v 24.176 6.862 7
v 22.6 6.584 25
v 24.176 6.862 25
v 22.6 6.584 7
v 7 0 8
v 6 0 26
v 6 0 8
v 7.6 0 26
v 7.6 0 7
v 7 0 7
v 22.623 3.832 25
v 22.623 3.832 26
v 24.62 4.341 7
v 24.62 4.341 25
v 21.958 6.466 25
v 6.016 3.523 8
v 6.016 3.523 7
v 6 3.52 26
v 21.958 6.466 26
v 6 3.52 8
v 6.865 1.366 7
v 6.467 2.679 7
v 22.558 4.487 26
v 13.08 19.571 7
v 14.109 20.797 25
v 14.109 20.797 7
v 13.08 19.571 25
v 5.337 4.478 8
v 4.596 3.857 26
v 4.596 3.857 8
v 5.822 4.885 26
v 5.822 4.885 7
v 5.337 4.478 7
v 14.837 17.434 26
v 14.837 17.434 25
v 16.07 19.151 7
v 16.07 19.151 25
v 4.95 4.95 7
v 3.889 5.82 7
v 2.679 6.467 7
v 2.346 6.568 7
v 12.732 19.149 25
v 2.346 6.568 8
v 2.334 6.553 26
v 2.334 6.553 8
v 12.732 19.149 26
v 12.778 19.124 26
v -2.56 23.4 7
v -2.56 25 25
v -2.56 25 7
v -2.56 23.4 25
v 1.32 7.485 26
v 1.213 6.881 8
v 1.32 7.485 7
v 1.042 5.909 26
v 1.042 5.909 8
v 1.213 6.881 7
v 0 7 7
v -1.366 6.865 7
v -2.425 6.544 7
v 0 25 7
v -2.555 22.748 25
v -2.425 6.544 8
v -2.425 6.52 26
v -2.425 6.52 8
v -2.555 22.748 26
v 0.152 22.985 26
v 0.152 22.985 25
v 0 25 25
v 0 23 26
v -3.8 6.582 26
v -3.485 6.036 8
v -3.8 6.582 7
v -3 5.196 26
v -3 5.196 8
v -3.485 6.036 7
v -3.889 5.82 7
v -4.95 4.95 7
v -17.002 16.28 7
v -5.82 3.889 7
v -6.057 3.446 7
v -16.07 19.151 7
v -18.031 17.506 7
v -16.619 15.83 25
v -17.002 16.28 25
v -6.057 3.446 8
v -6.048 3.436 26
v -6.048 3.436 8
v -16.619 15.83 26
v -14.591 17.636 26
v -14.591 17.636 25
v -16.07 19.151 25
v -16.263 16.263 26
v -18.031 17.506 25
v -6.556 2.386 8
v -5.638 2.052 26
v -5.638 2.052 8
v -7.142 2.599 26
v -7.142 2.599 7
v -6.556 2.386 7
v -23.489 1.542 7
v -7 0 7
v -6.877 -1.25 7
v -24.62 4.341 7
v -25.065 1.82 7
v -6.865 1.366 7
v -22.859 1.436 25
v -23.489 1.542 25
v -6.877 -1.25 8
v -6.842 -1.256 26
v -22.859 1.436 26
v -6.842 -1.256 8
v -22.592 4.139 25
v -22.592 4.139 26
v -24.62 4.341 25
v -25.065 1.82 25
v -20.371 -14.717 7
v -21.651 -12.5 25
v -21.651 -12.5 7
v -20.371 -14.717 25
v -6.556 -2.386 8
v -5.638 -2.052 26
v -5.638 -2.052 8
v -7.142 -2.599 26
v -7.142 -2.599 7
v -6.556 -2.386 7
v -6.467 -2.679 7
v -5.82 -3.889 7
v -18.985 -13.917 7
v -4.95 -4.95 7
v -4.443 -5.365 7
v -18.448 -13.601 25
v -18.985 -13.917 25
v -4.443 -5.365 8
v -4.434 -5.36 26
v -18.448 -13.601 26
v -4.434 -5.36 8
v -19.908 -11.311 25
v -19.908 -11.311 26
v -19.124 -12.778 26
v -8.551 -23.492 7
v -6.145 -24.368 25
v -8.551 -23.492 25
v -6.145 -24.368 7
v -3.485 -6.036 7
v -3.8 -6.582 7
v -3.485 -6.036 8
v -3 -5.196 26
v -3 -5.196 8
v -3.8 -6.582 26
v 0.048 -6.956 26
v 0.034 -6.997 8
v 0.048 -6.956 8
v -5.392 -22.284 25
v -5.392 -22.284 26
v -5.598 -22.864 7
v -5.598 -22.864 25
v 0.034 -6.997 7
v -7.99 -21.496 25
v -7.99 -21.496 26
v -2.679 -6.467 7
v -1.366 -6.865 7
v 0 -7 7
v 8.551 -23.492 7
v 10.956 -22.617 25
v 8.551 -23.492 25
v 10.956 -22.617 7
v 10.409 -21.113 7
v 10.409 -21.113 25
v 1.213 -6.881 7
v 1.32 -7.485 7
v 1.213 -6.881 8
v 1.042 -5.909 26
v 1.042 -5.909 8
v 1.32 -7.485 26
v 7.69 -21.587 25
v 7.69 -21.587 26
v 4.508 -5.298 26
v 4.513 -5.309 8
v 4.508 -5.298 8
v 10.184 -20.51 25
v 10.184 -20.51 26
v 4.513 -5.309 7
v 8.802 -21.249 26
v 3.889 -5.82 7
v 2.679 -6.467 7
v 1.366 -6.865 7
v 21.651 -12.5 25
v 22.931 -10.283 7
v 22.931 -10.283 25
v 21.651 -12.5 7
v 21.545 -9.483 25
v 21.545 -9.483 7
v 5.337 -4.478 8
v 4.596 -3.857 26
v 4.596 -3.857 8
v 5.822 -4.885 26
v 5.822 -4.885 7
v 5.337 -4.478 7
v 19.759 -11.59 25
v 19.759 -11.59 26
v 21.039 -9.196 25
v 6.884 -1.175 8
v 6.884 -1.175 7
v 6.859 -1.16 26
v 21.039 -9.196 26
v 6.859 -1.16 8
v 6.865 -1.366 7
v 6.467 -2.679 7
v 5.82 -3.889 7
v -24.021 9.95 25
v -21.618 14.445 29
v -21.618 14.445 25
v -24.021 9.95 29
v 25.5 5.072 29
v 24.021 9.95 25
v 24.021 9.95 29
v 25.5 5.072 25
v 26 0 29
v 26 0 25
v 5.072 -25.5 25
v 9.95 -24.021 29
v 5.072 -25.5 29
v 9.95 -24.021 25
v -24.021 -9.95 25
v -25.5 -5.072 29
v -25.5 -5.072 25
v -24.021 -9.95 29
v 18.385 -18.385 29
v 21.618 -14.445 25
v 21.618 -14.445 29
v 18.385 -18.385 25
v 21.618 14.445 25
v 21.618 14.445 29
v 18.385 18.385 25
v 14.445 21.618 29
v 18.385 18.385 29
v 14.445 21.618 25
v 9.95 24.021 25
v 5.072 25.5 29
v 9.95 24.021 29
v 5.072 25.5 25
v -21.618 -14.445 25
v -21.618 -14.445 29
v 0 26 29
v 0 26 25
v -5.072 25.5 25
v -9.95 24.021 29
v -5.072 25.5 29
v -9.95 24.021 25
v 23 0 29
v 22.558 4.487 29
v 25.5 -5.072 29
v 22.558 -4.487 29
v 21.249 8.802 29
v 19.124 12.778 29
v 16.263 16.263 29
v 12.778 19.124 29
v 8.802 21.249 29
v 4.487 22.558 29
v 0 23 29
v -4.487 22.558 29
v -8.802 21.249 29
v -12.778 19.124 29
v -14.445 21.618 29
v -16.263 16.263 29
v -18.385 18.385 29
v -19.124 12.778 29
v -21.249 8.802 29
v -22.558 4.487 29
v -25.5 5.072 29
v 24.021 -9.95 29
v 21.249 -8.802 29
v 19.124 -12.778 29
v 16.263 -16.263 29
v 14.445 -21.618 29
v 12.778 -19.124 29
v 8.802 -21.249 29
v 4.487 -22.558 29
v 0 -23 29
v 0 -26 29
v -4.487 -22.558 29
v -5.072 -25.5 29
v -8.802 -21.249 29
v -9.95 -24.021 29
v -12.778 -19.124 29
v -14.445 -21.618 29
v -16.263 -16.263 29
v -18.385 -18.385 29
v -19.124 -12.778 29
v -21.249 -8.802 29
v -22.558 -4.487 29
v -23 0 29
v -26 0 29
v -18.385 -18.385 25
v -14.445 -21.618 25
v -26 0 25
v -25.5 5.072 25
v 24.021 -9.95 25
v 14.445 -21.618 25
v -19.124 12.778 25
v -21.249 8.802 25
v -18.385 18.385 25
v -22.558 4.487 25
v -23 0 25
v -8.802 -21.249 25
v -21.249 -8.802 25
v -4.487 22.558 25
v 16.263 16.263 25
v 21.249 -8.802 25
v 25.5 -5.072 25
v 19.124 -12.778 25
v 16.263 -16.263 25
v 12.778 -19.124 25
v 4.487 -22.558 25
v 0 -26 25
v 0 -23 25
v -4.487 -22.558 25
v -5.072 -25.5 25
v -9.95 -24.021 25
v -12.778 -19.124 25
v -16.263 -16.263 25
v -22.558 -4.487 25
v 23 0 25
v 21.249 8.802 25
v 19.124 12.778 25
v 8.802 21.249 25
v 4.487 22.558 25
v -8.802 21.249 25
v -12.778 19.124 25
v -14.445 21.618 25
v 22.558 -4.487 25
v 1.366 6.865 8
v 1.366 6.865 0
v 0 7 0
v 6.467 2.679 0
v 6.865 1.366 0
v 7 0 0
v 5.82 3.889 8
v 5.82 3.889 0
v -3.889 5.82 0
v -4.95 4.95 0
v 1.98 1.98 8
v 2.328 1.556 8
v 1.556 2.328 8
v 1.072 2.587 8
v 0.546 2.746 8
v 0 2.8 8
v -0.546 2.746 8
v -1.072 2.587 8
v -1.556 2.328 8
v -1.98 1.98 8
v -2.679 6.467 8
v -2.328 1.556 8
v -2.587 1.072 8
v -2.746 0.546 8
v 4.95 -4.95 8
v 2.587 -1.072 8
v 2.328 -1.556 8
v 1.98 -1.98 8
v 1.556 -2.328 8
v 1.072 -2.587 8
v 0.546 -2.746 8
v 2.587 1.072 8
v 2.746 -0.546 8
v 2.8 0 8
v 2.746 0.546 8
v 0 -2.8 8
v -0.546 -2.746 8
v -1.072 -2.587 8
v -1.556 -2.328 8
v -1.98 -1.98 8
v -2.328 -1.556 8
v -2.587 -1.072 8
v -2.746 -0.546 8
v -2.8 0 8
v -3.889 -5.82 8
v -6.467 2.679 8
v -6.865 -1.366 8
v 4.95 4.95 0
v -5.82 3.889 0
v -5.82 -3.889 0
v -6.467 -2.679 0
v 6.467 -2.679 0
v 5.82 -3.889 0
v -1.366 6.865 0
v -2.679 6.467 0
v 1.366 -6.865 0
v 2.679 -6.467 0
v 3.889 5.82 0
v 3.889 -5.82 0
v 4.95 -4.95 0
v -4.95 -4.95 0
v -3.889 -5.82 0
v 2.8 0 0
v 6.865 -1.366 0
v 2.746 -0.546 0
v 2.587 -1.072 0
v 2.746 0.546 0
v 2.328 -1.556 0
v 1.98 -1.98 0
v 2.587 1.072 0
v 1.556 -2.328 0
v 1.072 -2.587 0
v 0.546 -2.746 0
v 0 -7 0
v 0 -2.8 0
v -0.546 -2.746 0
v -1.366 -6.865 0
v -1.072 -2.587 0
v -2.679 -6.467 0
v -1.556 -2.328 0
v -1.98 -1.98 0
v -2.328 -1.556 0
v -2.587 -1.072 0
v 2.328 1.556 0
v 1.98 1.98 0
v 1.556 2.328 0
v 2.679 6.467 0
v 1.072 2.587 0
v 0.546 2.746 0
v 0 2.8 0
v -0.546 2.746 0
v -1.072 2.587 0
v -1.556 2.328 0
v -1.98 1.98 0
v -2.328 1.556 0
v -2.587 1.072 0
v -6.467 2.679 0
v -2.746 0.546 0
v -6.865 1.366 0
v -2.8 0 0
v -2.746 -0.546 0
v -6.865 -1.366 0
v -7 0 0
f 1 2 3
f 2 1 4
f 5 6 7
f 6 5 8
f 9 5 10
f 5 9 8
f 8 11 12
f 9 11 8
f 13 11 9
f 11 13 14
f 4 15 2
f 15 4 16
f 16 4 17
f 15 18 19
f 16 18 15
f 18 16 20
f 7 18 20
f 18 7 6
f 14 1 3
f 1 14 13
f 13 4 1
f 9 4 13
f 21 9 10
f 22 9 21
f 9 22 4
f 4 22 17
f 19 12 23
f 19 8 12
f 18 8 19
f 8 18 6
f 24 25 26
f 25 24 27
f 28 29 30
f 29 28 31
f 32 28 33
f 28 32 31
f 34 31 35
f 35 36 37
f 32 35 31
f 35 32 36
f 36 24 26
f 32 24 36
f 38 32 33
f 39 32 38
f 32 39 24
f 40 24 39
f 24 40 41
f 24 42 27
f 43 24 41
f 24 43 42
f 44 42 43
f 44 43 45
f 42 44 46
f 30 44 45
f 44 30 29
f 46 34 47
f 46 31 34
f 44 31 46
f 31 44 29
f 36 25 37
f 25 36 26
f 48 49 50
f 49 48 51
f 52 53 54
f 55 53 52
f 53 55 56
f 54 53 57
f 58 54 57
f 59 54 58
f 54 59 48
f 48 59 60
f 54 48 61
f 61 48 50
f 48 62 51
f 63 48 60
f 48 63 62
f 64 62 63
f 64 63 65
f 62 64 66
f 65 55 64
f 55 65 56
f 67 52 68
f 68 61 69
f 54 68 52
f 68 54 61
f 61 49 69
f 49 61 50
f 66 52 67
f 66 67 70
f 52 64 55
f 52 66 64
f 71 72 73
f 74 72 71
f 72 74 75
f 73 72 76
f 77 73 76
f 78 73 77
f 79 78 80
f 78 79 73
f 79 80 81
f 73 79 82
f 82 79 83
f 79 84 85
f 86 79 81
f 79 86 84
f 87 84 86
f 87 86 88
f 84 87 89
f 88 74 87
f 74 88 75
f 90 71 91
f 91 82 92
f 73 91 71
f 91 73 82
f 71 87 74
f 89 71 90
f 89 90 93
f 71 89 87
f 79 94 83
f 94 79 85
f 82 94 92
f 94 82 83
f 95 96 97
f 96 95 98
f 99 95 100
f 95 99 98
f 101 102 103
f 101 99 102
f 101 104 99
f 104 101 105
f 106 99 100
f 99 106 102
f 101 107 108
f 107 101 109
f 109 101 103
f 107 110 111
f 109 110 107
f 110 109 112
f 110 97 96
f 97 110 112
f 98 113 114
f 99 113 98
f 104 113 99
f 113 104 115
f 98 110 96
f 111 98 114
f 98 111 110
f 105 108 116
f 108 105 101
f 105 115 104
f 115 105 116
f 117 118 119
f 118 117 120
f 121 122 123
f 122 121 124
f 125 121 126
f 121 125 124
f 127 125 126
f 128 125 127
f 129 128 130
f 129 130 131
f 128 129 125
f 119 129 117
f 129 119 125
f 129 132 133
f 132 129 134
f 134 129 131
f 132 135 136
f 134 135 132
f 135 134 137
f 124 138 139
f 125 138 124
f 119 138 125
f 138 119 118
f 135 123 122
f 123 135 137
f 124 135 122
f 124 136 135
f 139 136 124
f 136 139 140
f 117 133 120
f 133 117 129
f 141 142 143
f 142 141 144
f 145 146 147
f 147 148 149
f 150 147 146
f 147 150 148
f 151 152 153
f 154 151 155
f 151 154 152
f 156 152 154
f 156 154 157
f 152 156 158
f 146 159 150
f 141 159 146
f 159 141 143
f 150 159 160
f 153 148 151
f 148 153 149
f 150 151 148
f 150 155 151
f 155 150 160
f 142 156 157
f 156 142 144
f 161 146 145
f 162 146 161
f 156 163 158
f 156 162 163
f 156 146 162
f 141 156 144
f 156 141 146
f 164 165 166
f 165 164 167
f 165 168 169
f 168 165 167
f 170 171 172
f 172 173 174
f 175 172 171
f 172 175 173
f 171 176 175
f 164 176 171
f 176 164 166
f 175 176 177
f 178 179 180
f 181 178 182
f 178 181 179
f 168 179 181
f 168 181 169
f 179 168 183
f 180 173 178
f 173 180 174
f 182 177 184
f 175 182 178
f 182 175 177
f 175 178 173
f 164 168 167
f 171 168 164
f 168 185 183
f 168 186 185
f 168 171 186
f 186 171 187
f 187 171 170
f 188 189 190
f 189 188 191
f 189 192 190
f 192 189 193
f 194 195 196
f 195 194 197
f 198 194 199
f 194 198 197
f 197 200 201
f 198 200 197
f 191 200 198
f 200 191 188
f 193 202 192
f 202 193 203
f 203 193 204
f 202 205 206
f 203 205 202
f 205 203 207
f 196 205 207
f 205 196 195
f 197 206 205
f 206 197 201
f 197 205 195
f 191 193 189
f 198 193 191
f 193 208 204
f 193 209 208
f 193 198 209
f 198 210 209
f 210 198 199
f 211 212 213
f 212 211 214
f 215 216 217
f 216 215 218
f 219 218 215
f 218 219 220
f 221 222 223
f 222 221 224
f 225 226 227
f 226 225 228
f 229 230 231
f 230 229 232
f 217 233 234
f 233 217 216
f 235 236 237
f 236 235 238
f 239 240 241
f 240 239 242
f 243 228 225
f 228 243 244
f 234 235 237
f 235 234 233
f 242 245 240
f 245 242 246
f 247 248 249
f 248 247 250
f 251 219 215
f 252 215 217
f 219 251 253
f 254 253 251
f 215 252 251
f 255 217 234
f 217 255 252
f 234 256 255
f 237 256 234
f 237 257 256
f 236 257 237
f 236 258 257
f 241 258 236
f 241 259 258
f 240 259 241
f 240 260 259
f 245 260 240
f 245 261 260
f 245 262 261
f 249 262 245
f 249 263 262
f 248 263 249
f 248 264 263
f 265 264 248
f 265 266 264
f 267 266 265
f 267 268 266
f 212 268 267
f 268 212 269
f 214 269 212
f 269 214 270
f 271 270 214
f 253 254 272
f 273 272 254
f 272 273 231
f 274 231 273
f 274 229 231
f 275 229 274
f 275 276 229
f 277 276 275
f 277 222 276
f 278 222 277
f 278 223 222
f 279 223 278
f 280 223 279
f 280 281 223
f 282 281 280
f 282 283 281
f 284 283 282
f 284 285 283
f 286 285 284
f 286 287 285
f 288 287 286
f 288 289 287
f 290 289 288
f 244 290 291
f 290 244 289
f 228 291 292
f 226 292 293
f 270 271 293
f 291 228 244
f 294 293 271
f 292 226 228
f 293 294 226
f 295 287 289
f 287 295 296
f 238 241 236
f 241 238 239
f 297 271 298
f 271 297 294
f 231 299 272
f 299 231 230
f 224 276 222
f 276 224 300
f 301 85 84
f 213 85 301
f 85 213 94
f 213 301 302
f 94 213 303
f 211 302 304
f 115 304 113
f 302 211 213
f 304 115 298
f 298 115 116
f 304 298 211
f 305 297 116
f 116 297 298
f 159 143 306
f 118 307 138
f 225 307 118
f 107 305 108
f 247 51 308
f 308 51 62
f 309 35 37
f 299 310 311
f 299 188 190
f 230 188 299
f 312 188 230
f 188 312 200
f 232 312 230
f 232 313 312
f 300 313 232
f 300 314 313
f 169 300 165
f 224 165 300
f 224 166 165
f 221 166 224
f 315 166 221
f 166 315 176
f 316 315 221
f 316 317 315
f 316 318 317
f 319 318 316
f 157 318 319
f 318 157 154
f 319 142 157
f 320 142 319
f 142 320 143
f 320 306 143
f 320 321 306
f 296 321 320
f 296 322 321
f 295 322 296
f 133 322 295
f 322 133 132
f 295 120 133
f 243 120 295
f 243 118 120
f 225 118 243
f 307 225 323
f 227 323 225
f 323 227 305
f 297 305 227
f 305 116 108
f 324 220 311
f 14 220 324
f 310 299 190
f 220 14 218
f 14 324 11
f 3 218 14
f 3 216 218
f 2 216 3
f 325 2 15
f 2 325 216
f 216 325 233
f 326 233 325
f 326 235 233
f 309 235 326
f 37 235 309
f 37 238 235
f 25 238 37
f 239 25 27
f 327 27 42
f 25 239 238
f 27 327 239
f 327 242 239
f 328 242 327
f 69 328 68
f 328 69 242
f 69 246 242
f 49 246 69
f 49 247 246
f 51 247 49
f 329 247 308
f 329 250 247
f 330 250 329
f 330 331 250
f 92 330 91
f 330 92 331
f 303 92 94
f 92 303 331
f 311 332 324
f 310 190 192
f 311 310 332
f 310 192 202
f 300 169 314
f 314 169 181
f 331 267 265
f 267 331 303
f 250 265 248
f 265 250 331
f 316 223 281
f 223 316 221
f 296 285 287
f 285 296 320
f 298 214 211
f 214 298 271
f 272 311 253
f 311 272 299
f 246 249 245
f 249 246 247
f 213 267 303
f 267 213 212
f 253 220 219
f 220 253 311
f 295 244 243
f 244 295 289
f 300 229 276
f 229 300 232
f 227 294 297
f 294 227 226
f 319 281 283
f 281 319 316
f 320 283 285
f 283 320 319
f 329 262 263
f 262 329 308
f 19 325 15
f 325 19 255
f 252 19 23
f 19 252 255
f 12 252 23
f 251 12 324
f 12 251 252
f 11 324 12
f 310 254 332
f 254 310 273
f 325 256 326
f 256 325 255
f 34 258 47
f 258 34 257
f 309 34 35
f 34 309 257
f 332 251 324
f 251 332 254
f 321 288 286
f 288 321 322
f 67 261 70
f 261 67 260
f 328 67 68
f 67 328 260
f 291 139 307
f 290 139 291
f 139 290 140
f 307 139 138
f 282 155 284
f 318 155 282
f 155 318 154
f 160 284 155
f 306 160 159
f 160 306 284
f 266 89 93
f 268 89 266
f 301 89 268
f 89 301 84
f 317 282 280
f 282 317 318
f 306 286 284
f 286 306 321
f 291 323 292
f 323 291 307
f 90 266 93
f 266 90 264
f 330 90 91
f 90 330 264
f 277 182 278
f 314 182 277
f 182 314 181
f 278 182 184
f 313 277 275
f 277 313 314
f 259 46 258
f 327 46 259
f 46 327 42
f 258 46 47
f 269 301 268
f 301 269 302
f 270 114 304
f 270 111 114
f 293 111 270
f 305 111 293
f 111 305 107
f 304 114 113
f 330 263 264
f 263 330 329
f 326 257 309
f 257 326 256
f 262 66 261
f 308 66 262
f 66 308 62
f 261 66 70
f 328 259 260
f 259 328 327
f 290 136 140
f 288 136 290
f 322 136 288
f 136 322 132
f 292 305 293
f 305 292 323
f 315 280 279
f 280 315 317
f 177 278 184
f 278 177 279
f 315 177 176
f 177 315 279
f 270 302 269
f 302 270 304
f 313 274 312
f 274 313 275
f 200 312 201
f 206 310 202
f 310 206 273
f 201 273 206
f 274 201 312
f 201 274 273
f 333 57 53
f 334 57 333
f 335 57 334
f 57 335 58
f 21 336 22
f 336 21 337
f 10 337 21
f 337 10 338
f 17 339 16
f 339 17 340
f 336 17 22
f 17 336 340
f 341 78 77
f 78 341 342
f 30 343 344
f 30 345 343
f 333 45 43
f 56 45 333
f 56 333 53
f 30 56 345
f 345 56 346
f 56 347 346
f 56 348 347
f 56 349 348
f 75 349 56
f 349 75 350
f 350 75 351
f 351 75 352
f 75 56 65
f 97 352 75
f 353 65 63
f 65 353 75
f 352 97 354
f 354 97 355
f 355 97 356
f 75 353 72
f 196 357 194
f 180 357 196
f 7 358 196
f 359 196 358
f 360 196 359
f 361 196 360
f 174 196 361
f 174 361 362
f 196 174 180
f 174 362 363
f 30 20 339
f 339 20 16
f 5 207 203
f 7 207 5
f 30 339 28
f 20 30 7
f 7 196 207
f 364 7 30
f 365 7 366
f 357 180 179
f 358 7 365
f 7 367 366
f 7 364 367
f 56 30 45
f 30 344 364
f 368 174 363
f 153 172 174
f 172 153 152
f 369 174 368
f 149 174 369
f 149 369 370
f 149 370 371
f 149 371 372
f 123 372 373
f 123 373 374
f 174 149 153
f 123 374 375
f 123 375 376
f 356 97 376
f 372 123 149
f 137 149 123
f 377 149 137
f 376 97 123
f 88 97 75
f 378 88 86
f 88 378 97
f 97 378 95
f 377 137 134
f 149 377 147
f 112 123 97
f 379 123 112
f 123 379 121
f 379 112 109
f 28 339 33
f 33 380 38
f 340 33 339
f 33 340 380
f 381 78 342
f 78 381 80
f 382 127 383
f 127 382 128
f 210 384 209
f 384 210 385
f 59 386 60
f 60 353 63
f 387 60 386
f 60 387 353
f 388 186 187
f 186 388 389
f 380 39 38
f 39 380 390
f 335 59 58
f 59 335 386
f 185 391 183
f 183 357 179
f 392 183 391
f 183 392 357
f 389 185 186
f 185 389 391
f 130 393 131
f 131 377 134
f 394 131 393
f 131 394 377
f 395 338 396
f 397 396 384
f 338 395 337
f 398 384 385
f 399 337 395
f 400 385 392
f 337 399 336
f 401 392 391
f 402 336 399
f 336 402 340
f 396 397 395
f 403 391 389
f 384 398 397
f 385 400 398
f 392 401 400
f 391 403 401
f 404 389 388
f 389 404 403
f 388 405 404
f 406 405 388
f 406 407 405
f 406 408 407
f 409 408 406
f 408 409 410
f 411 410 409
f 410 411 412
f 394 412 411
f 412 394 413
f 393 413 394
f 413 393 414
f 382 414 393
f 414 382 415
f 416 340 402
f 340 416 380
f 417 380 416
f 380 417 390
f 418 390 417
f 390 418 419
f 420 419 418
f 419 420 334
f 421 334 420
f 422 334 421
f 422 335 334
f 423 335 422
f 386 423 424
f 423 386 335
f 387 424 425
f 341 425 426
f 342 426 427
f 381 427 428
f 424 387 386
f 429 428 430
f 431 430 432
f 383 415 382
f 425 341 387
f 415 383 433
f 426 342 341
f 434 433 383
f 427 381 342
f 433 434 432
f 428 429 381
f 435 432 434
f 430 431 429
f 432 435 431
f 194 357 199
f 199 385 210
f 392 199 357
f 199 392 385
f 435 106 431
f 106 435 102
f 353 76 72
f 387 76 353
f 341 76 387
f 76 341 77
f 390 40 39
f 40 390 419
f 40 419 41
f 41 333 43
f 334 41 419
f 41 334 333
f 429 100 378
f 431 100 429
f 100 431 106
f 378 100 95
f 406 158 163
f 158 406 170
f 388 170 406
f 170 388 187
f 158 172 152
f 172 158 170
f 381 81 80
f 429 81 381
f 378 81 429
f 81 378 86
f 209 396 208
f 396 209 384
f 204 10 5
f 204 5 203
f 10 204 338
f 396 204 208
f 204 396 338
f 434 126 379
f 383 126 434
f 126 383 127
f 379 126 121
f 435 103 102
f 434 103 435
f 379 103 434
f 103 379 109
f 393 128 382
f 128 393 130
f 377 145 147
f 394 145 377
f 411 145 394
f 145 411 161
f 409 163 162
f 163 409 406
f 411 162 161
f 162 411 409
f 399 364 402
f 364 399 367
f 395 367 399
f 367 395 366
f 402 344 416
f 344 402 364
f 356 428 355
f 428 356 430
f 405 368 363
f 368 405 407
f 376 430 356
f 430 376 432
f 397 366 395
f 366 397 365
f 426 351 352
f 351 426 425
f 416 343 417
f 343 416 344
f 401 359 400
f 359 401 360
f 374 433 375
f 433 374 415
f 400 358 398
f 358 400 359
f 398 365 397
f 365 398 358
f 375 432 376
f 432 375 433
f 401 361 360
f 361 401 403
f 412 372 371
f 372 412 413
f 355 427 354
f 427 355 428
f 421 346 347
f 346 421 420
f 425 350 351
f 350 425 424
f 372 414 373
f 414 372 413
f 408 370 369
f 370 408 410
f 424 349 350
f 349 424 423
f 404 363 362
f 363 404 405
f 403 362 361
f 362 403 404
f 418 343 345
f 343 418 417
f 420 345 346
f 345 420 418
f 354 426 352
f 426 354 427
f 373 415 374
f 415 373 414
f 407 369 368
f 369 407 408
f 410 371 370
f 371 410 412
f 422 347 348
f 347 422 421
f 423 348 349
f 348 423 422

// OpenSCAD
$fn = 32;

// ----------------------------------------------------------------------
// Impeller: 50 mm, 9 blades, 29 mm tall
// ----------------------------------------------------------------------

// --- parameters (mm) ---
boss_d = 14;              // hub diameter
boss_h = 8;               // hub height
rotor_d = 50;             // outer diameter over the blades
vane_count = 9;           // number of blades
blade_t = 1.6;            // blade thickness
blade_h = 18;             // blade height
blade_in_r = 6;           // blade root radius
blade_out_r = 23.4;       // blade tip radius
sweep = 10;               // blade sweep, degrees
bore_d = 5.6;             // shaft bore
shroud_h = 3;             // shroud ring thickness
shroud_d = 52;            // shroud outside diameter

module hub() {
  cylinder(h = boss_h, d = boss_d);
}

module blade() {
  /* blade swept between two boxes: hull of the root and the tip section */
  hull() {
    translate([blade_in_r, 0, boss_h - 1])
      cube([blade_t, blade_t * 2.2, blade_h + 1], center = false);
    rotate([0, 0, sweep])
      translate([blade_out_r, 0, boss_h - 1])
        cube([blade_t, blade_t * 1.6, blade_h + 1], center = false);
  }
}

module blades() {
  for (i = [0 : vane_count - 1])
    rotate([0, 0, i * 360 / vane_count]) blade();
}

module shroud() {
  translate([0, 0, boss_h + blade_h - 1])
    difference() {
      cylinder(h = shroud_h + 1, d = shroud_d);
      translate([0, 0, -1]) cylinder(h = shroud_h + 3, d = shroud_d - 2 * 3);
    }
}

difference() {
  union() {
    hub();
    blades();
    shroud();
  }
  translate([0, 0, -1]) cylinder(h = boss_h + blade_h + shroud_h + 3, d = bore_d);
}
